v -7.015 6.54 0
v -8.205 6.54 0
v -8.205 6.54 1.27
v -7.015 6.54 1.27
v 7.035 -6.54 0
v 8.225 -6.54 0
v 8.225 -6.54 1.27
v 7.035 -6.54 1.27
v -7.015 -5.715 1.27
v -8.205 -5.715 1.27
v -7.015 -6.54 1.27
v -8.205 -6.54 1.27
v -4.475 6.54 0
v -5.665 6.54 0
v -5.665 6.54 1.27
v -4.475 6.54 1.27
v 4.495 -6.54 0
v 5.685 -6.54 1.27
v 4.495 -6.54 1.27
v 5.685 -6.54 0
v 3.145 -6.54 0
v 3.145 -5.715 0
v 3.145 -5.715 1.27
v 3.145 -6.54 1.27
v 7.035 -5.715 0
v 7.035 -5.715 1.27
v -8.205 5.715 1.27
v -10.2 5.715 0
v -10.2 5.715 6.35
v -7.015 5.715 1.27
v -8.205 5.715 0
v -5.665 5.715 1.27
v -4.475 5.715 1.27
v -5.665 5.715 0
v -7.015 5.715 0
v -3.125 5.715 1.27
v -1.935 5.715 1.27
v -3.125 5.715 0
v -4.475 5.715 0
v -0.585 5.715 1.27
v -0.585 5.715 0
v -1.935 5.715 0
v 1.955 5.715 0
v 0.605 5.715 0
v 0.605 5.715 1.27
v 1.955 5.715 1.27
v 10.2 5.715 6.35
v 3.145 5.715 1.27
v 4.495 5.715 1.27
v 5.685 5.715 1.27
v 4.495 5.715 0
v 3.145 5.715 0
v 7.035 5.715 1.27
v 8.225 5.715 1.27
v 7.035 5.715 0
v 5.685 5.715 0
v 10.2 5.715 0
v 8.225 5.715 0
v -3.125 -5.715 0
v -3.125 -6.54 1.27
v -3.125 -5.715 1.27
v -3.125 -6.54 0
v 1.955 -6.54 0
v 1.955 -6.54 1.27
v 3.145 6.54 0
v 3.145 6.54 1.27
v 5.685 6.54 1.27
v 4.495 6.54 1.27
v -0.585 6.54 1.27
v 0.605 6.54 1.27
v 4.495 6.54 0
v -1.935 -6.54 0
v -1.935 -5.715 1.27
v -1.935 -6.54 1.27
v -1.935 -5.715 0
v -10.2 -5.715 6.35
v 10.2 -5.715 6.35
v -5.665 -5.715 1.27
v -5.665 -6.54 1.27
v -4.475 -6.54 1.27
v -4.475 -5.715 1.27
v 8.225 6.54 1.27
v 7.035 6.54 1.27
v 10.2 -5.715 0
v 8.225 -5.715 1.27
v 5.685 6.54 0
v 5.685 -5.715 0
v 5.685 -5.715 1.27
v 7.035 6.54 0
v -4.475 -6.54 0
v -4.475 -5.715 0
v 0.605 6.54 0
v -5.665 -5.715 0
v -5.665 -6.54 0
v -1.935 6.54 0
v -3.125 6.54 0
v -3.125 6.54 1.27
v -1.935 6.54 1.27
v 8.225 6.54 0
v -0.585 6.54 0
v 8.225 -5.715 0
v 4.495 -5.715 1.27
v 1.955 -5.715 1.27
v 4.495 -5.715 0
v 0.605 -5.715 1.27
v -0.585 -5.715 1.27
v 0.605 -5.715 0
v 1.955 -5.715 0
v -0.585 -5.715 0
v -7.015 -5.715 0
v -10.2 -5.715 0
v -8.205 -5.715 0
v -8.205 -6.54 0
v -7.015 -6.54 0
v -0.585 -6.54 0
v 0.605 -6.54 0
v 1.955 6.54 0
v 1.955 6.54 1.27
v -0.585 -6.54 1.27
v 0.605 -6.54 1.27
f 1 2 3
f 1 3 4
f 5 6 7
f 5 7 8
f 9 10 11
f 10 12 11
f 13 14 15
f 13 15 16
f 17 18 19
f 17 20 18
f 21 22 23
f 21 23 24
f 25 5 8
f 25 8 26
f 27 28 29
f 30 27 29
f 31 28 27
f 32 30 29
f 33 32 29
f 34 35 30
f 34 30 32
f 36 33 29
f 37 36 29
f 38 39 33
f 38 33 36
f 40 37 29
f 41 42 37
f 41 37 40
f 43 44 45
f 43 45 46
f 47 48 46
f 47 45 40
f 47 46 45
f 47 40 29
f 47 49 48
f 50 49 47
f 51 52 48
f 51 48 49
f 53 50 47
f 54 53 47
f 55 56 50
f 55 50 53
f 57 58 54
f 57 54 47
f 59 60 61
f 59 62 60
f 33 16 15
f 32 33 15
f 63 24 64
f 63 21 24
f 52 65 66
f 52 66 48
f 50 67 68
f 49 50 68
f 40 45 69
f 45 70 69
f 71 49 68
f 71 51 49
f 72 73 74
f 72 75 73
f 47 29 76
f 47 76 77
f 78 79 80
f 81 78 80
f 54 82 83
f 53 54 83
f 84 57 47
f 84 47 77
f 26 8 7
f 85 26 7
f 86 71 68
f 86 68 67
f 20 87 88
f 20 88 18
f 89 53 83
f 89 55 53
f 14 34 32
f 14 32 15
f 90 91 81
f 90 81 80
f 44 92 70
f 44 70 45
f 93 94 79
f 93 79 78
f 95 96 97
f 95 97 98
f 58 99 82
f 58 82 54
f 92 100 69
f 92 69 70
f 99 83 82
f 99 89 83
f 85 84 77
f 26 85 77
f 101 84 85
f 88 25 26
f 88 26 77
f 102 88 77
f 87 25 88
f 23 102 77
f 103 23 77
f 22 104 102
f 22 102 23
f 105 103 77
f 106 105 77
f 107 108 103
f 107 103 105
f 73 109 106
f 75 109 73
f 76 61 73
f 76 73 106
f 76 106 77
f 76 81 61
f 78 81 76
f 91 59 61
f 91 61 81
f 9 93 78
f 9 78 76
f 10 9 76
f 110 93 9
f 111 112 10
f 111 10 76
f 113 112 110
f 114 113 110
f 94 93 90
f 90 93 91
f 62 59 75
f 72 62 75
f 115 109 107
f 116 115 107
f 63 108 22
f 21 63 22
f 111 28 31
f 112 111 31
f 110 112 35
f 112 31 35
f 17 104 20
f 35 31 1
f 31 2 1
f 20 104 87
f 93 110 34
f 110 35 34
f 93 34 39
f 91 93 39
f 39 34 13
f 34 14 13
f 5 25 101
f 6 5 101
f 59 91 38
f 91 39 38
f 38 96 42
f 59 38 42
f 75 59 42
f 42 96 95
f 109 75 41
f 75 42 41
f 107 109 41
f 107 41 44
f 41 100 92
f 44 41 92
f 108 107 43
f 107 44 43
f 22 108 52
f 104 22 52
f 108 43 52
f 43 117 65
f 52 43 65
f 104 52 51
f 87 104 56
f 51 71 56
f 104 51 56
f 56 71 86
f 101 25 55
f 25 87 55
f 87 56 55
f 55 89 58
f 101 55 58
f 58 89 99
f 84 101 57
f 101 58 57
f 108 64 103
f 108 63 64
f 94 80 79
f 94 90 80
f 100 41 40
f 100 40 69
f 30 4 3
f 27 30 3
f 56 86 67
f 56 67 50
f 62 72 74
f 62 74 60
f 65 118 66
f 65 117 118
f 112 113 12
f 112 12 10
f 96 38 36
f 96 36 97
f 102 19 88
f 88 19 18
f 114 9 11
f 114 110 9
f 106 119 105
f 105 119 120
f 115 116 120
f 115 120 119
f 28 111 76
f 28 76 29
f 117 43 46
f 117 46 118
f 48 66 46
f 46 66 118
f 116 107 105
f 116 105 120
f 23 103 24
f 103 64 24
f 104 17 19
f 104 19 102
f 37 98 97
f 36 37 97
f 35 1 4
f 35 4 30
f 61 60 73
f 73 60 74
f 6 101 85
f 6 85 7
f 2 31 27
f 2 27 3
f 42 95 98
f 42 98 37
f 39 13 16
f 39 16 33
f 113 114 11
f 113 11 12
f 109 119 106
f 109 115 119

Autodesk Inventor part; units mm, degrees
ref_plane "YZ Plane" through (0, 0, 0) normal (1, 0, 0) x (0, 1, 0)
ref_plane "XZ Plane" through (0, 0, 0) normal (0, 1, 0) x (-1, 0, 0)
ref_plane "XY Plane" through (0, 0, 0) normal (0, 0, 1) x (1, 0, 0)
sketch "Sketch1" plane through (0, 0, 0) normal (0, 0, 1) x (1, 0, 0)
  line L0 (-10.2, 5.715) -> (10.2, 5.715)
  line L1 (10.2, 5.715) -> (10.2, -5.715)
  line L2 (10.2, -5.715) -> (-10.2, -5.715)
  line L3 (-10.2, -5.715) -> (-10.2, 5.715)
  point P0 (0, 0)
  dimension "d0" = 20.4
  dimension "d1" = 10.2
  dimension "d2" = 11.43
  dimension "d3" = 5.715
extrude "Extrusion1" add sketch "Sketch1" along normal blind 6.35
sketch "Sketch2" plane through (0, 0, 0) normal (0, 0, -1) x (-1, 0, 0)
  line L0 (8.205, 6.54) -> (7.015, 6.54)
  line L1 (7.015, 6.54) -> (7.015, 4.89)
  line L2 (7.015, 4.89) -> (8.205, 4.89)
  line L3 (8.205, 4.89) -> (8.205, 6.54)
  line L4 (10.2, 5.715) -> (-10.2, 5.715) projected
  line L5 (10.2, -5.715) -> (10.2, 5.715) projected
  point P0 (0, 0)
  dimension "d6" = 1.65
  dimension "d7" = 0.825
  dimension "d8" = 1.19
  dimension "d9" = 1.995
extrude "Extrusion2" add sketch "Sketch2" against normal blind 1.27
pattern_linear "Rectangular Pattern1" count 7 spacing 2.54 along (1, 0, 0) of "Extrusion2"
mirror "Mirror1" about plane through (0, 0, 0) normal (0, 1, 0) of "Extrusion2", "Rectangular Pattern1"
properties part number "MC_BK276"
